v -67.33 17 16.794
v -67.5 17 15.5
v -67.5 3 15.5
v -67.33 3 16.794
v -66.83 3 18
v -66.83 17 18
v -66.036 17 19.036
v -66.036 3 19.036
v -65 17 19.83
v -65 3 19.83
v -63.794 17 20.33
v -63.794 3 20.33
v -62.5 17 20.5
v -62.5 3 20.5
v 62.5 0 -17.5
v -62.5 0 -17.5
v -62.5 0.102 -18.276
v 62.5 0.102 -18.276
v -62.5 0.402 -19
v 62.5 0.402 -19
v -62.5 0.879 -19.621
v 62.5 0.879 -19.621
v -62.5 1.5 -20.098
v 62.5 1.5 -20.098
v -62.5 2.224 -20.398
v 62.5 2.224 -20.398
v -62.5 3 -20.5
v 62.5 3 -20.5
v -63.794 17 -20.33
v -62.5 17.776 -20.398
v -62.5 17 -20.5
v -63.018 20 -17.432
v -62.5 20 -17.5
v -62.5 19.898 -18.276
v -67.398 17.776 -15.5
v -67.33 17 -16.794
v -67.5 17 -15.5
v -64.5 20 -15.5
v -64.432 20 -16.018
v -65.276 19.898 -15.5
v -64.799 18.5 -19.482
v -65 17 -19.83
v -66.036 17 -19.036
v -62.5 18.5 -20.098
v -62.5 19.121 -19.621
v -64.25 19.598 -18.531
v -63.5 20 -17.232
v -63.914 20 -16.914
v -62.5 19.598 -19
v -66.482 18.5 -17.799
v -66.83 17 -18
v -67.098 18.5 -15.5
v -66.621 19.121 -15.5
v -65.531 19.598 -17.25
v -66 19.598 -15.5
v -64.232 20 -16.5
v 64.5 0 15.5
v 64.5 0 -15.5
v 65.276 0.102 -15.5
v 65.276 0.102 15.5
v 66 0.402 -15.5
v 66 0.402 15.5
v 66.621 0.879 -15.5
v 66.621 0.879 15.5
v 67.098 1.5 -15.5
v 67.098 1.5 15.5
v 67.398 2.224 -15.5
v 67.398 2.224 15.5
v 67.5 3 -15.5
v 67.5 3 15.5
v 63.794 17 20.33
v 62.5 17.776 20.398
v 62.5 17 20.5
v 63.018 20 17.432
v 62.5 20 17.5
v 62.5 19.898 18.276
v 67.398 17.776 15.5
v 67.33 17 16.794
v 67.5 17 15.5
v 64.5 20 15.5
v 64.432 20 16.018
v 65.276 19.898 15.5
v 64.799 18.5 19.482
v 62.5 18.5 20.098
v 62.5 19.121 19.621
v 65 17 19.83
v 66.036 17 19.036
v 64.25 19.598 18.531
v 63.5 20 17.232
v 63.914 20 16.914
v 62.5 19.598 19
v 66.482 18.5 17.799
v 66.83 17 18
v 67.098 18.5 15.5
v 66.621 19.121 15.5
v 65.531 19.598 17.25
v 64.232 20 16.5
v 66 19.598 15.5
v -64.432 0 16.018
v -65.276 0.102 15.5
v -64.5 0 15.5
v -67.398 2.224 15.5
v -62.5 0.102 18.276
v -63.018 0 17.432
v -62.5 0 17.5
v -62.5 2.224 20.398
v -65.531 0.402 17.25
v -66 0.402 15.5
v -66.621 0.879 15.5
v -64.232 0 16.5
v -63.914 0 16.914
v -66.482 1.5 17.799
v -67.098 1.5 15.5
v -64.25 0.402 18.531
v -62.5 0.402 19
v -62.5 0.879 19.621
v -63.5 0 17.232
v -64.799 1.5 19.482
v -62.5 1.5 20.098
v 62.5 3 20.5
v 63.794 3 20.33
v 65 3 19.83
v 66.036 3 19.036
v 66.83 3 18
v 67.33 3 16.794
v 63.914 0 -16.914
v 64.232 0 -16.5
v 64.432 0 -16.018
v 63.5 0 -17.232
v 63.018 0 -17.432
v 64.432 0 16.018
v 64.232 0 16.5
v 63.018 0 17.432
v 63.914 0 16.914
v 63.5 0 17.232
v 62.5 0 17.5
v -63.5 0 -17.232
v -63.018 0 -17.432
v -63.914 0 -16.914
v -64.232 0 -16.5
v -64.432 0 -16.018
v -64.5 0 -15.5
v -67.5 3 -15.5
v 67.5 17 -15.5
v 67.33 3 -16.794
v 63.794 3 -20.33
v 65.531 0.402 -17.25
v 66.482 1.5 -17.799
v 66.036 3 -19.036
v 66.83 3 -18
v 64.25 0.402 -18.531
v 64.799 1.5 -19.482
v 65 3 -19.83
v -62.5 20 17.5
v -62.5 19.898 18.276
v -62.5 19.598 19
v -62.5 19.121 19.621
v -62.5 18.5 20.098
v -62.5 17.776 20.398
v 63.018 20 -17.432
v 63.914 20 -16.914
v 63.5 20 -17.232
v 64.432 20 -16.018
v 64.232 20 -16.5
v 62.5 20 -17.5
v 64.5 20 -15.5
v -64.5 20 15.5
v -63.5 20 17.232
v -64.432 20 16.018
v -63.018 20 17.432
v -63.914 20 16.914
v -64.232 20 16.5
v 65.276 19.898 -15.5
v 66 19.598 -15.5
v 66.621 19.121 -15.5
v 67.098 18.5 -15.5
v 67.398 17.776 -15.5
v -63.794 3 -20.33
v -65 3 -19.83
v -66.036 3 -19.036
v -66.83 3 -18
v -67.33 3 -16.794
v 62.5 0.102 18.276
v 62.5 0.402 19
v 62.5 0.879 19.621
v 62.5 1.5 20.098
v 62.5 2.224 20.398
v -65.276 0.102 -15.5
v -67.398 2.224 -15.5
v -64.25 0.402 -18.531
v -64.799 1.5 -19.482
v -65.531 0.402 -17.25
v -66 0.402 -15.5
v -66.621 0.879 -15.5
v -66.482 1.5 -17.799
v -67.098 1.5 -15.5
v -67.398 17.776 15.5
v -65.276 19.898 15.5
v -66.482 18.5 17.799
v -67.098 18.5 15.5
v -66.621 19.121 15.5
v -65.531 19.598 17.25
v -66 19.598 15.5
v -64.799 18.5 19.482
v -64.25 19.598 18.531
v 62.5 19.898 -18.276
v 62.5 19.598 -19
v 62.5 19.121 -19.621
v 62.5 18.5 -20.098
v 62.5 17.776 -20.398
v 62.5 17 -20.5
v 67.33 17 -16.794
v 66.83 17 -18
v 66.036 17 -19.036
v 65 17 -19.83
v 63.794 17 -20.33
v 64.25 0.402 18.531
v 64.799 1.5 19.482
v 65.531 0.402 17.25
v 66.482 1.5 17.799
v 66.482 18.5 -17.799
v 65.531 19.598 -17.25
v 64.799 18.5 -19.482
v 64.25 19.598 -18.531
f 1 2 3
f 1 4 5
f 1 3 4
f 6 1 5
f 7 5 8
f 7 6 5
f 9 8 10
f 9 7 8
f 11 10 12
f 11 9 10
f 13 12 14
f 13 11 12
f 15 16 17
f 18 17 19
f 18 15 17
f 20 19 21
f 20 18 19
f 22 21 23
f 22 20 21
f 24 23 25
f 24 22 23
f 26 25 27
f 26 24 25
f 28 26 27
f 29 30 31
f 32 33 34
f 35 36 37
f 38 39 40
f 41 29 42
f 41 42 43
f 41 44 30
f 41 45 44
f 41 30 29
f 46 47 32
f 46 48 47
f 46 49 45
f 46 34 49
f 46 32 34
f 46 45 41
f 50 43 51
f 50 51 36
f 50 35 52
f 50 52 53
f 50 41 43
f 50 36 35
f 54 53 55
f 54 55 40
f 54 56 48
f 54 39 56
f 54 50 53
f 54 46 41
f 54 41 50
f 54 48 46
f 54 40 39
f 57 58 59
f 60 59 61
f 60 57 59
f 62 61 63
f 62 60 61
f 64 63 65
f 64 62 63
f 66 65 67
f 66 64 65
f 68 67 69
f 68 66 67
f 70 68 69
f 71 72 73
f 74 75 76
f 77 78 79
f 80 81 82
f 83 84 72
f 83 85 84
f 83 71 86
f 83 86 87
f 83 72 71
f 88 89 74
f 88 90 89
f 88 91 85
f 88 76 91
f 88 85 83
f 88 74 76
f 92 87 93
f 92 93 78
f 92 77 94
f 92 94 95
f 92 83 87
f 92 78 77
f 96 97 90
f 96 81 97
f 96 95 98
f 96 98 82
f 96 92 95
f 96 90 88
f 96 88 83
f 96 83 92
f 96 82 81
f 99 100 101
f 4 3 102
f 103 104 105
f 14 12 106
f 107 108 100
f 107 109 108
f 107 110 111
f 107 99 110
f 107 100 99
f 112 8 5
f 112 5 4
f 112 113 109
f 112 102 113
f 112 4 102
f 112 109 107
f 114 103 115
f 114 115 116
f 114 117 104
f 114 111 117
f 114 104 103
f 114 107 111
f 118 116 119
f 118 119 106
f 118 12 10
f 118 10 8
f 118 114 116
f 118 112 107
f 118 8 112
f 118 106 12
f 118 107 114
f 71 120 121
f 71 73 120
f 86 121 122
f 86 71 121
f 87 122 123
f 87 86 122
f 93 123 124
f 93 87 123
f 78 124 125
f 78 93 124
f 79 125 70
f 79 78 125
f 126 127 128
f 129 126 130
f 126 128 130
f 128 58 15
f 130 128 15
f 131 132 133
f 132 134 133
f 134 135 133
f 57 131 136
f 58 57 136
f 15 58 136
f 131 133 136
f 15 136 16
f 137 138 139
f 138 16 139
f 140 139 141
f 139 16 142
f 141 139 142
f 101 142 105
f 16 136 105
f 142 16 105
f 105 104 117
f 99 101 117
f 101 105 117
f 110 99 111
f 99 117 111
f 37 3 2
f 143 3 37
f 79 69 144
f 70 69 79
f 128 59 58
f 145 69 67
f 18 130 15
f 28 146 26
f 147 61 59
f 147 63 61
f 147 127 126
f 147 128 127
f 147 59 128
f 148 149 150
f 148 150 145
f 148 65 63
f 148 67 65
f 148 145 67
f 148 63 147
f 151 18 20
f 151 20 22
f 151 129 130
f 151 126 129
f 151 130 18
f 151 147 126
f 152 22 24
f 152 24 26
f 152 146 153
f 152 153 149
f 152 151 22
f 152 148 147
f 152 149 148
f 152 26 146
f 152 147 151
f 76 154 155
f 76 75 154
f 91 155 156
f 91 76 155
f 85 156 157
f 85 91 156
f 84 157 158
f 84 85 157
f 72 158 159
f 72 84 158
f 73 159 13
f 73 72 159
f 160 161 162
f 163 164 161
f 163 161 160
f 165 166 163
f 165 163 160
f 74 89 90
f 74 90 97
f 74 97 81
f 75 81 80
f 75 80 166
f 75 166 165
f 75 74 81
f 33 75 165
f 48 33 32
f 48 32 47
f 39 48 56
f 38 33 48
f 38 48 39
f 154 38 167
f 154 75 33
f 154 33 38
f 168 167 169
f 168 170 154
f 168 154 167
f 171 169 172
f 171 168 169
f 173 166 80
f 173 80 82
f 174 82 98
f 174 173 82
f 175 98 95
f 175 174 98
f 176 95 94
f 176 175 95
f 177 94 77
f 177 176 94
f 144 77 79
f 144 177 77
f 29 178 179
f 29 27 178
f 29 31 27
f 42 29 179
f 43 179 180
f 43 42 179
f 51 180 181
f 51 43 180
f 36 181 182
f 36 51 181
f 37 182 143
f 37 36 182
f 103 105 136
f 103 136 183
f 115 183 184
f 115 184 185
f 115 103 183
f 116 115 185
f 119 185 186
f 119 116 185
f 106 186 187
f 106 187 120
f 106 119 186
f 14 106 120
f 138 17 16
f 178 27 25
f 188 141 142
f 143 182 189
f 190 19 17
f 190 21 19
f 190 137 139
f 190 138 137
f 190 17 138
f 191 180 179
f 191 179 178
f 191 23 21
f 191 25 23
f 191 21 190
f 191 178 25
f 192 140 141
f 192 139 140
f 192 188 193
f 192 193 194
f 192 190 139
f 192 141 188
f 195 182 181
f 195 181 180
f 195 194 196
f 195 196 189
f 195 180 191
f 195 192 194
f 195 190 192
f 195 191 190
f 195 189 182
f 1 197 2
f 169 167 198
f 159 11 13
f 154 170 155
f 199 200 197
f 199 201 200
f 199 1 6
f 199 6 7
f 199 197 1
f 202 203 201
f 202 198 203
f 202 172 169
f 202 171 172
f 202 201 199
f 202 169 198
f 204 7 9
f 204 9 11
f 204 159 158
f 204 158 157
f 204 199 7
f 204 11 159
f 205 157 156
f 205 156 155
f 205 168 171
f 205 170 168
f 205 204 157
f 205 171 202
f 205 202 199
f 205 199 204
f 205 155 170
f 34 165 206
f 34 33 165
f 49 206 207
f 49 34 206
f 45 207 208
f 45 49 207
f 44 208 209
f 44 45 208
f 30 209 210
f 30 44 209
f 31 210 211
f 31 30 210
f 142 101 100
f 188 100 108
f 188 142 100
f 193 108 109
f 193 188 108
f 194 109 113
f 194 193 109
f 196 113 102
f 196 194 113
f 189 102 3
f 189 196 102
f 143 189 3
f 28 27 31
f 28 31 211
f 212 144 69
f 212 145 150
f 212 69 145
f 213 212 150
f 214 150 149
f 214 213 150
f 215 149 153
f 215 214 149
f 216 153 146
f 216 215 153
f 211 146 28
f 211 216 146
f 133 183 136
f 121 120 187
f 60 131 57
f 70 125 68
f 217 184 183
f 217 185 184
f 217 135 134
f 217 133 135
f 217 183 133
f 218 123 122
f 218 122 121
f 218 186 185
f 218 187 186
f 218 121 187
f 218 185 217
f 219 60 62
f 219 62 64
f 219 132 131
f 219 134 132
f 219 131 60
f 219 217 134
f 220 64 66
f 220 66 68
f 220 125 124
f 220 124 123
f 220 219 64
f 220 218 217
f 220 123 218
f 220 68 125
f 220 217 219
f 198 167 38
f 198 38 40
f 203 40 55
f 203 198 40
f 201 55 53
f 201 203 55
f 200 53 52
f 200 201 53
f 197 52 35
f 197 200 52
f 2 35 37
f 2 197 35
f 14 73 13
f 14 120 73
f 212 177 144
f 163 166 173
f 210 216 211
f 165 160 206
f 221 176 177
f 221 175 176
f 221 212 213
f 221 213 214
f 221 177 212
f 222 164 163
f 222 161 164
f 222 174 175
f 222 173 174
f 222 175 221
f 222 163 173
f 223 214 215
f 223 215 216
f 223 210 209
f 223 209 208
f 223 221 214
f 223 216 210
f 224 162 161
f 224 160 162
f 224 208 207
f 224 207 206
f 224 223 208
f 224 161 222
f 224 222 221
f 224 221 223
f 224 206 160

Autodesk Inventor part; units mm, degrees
ref_plane "YZ Plane" through (0, 0, 0) normal (1, 0, 0) x (0, 1, 0)
ref_plane "XZ Plane" through (0, 0, 0) normal (0, 1, 0) x (-1, 0, 0)
ref_plane "XY Plane" through (0, 0, 0) normal (0, 0, 1) x (1, 0, 0)
sketch "Sketch1" plane through (0, 0, 0) normal (0, 1, 0) x (-1, 0, 0)
  line L0 (-67.5, 20.5) -> (67.5, 20.5)
  line L1 (67.5, 20.5) -> (67.5, -20.5)
  line L2 (67.5, -20.5) -> (-67.5, -20.5)
  line L3 (-67.5, -20.5) -> (-67.5, 20.5)
  line L4 (-67.5, 20.5) -> (67.5, -20.5) construction
  line L5 (67.5, 20.5) -> (-67.5, -20.5) construction
  point P0 (0, 0)
  dimension "d0" = 135
  dimension "d1" = 41
extrude "Extrusion1" add sketch "Sketch1" along normal blind 20
fillet "Fillet1" radius 5 4 edges at (-67.5, 10, 20.5) (-67.5, 10, -20.5) (67.5, 10, -20.5) (67.5, 10, 20.5)
fillet "Fillet2" radius 3 16 edges at (66.0355, 20, 19.0355) (67.5, 20, 0) (66.0355, 20, -19.0355) (0, 20, -20.5) (-66.0355, 20, -19.0355) (-67.5, 20, 0) (-66.0355, 20, 19.0355) (0, 20, 20.5) (-66.0355, 0, 19.0355) (-67.5, 0, 0) (-66.0355, 0, -19.0355) (0, 0, -20.5) (66.0355, 0, -19.0355) (67.5, 0, 0) (66.0355, 0, 19.0355) (0, 0, 20.5)
properties part number "Batteri" material "Aluminum 6061"
